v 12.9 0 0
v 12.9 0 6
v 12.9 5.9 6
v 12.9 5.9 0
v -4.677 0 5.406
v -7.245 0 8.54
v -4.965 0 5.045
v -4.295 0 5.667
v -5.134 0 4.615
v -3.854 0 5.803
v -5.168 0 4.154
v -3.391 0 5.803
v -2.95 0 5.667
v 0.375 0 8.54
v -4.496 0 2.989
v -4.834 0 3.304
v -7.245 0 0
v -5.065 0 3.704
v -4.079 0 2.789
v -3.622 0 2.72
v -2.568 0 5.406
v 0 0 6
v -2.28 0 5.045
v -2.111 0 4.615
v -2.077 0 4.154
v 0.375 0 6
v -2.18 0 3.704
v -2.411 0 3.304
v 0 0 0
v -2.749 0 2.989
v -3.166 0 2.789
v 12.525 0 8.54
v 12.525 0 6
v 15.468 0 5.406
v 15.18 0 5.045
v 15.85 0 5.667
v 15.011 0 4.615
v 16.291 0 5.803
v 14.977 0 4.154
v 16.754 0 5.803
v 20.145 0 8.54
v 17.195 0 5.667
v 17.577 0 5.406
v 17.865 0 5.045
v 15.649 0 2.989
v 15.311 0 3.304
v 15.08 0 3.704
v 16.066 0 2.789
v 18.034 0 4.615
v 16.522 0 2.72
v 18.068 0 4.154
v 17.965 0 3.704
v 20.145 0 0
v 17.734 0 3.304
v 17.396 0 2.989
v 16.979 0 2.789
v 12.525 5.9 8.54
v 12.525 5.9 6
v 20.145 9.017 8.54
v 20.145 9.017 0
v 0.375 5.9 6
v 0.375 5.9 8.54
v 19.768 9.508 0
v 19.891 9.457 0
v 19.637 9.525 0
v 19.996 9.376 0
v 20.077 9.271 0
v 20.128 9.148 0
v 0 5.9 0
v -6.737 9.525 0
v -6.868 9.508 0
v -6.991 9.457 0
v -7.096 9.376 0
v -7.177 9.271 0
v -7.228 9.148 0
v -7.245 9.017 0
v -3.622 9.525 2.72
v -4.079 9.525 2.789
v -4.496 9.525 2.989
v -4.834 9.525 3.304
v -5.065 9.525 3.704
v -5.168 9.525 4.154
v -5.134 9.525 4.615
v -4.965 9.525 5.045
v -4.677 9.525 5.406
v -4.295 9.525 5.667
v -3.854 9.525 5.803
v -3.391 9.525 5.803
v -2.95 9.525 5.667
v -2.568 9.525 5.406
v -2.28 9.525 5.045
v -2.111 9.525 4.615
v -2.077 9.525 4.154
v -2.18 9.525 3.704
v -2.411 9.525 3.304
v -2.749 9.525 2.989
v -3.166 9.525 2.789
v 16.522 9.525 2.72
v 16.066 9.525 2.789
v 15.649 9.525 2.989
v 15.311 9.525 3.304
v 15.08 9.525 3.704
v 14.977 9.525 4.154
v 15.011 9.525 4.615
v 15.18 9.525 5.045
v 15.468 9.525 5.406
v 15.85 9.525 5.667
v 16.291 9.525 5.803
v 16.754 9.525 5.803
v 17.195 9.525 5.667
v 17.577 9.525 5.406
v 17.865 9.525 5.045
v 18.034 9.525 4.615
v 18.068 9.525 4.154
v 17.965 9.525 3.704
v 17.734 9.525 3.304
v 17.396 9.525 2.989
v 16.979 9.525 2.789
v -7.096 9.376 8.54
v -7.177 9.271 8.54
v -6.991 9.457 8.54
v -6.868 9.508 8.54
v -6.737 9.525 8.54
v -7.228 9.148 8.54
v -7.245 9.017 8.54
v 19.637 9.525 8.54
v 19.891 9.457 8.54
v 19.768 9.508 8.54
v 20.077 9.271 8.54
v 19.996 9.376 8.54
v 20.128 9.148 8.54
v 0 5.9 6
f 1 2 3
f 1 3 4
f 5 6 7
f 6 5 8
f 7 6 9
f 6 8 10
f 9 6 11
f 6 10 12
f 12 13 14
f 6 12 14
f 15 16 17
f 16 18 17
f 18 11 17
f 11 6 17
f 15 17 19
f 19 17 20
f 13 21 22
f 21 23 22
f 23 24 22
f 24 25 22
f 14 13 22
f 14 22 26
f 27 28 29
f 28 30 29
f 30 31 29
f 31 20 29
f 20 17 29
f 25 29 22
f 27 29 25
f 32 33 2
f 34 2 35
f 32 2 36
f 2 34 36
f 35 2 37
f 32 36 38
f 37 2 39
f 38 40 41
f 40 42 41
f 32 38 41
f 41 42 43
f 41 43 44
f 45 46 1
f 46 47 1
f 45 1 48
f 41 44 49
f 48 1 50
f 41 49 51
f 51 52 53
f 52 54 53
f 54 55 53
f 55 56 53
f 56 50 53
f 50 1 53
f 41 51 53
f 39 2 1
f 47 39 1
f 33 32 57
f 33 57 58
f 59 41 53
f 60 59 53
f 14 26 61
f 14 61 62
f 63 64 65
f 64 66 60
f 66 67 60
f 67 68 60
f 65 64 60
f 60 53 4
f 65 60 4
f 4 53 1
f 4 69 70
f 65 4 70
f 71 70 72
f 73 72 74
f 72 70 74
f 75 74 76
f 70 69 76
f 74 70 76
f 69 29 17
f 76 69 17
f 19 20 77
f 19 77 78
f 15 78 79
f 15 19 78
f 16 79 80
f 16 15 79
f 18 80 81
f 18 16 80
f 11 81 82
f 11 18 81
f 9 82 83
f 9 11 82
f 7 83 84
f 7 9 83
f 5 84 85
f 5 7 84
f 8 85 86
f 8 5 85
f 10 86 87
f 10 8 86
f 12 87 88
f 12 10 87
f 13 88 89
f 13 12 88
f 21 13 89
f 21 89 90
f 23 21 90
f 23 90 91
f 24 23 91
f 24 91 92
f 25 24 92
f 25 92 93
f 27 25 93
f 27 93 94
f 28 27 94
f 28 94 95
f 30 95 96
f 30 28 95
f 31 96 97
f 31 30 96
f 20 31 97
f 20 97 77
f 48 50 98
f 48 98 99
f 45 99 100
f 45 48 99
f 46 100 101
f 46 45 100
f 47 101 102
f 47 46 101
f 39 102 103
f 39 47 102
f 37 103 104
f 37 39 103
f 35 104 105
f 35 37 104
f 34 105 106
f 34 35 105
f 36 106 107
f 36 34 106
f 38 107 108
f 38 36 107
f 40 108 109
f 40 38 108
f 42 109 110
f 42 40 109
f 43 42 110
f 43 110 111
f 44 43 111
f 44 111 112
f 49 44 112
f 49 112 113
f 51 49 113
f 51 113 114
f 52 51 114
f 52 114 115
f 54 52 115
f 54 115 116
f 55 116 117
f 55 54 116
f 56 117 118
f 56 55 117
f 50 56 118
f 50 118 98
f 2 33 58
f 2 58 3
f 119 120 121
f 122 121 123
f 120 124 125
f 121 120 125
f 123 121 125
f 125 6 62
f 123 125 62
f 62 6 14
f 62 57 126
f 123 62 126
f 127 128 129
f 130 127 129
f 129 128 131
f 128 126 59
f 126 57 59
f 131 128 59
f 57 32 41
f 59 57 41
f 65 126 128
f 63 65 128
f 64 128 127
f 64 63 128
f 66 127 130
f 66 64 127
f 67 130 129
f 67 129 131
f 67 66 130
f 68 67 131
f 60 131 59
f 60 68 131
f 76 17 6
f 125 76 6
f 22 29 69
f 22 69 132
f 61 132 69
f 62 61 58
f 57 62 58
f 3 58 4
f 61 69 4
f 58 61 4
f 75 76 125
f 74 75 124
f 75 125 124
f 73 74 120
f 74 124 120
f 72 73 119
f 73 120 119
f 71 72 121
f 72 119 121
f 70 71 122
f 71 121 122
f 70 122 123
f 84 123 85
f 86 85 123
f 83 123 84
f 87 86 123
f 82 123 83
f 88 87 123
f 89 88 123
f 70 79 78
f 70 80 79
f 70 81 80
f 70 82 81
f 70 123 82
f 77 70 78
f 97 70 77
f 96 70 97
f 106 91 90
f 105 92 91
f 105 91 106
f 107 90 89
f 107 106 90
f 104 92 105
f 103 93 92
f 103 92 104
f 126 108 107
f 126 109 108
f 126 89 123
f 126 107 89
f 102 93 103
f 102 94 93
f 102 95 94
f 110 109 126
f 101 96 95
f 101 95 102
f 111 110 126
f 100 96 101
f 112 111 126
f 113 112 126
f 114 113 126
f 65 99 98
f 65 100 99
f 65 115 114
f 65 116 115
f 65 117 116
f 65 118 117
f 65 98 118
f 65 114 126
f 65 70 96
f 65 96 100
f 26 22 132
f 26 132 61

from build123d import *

# Parameters (mm, degrees)
SKETCH1_R           = 1.55
BOSS_EXTRUDE1_DEPTH = 9.525
CUT_EXTRUDE1_DEPTH  = 5.9
FILLET1_R           = 0.508


with BuildPart() as part:
    # Sketch1 → Boss-Extrude1 (new body)
    # profile 1 of 5: a face of its own
    with BuildSketch(Plane(origin=(0, 0, 0), x_dir=(1, 0, 0), z_dir=(0, 1, 0))):
        Polygon((0, -6), (0, 0), (-7.245, 0), (-7.245, -8.54), (0.375, -8.54), (0.375, -6), align=None)
        with Locations(Location((-3.6225, -4.27, 0), (0, 0, 90))):
            Circle(SKETCH1_R, mode=Mode.SUBTRACT)
    # profile 2 of 5: a face of its own
    with BuildSketch(Plane(origin=(0, 0, 0), x_dir=(1, 0, 0), z_dir=(0, 1, 0))):
        Polygon((12.9, -6), (12.9, 0), (0, 0), (0, -6), (0.375, -6), (0.375, -8.54), (12.525, -8.54), (12.525, -6), align=None)
    # profile 3 of 5: a face of its own
    with BuildSketch(Plane(origin=(0, 0, 0), x_dir=(1, 0, 0), z_dir=(0, 1, 0))):
        Polygon((20.145, 0), (12.9, 0), (12.9, -6), (12.525, -6), (12.525, -8.54), (20.145, -8.54), align=None)
        with Locations(Location((16.5225, -4.27, 0), (0, 0, 90))):
            Circle(SKETCH1_R, mode=Mode.SUBTRACT)
    # profile 4 of 5: a face of its own
    with BuildSketch(Plane(origin=(0, 0, 0), x_dir=(1, 0, 0), z_dir=(0, 1, 0))):
        Polygon((0, -6), (0, 0), (-7.245, 0), (-7.245, -8.54), (0.375, -8.54), (0.375, -6), align=None)
        with Locations(Location((-3.6225, -4.27, 0), (0, 0, 90))):
            Circle(SKETCH1_R, mode=Mode.SUBTRACT)
    # profile 5 of 5: a face of its own
    with BuildSketch(Plane(origin=(0, 0, 0), x_dir=(1, 0, 0), z_dir=(0, 1, 0))):
        Polygon((20.145, 0), (12.9, 0), (12.9, -6), (12.525, -6), (12.525, -8.54), (20.145, -8.54), align=None)
        with Locations(Location((16.5225, -4.27, 0), (0, 0, 90))):
            Circle(SKETCH1_R, mode=Mode.SUBTRACT)
    extrude(amount=BOSS_EXTRUDE1_DEPTH)

    # Sketch1<4> → Cut-Extrude1 (cut)
    with BuildSketch(Plane(origin=(0, 0, 0), x_dir=(1, 0, 0), z_dir=(0, 1, 0))):
        Polygon((12.9, -6), (12.9, 0), (0, 0), (0, -6), (0.375, -6), (0.375, -8.54), (12.525, -8.54), (12.525, -6), align=None)
    extrude(amount=CUT_EXTRUDE1_DEPTH, mode=Mode.SUBTRACT)

    # Fillet1
    fillet1_edges = [part.edges().sort_by_distance(p)[0] for p in [
        (-7.245, 9.525, 4.27),
        (20.145, 9.525, 4.27),
    ]]
    fillet(fillet1_edges, radius=FILLET1_R)


solid = part.part
